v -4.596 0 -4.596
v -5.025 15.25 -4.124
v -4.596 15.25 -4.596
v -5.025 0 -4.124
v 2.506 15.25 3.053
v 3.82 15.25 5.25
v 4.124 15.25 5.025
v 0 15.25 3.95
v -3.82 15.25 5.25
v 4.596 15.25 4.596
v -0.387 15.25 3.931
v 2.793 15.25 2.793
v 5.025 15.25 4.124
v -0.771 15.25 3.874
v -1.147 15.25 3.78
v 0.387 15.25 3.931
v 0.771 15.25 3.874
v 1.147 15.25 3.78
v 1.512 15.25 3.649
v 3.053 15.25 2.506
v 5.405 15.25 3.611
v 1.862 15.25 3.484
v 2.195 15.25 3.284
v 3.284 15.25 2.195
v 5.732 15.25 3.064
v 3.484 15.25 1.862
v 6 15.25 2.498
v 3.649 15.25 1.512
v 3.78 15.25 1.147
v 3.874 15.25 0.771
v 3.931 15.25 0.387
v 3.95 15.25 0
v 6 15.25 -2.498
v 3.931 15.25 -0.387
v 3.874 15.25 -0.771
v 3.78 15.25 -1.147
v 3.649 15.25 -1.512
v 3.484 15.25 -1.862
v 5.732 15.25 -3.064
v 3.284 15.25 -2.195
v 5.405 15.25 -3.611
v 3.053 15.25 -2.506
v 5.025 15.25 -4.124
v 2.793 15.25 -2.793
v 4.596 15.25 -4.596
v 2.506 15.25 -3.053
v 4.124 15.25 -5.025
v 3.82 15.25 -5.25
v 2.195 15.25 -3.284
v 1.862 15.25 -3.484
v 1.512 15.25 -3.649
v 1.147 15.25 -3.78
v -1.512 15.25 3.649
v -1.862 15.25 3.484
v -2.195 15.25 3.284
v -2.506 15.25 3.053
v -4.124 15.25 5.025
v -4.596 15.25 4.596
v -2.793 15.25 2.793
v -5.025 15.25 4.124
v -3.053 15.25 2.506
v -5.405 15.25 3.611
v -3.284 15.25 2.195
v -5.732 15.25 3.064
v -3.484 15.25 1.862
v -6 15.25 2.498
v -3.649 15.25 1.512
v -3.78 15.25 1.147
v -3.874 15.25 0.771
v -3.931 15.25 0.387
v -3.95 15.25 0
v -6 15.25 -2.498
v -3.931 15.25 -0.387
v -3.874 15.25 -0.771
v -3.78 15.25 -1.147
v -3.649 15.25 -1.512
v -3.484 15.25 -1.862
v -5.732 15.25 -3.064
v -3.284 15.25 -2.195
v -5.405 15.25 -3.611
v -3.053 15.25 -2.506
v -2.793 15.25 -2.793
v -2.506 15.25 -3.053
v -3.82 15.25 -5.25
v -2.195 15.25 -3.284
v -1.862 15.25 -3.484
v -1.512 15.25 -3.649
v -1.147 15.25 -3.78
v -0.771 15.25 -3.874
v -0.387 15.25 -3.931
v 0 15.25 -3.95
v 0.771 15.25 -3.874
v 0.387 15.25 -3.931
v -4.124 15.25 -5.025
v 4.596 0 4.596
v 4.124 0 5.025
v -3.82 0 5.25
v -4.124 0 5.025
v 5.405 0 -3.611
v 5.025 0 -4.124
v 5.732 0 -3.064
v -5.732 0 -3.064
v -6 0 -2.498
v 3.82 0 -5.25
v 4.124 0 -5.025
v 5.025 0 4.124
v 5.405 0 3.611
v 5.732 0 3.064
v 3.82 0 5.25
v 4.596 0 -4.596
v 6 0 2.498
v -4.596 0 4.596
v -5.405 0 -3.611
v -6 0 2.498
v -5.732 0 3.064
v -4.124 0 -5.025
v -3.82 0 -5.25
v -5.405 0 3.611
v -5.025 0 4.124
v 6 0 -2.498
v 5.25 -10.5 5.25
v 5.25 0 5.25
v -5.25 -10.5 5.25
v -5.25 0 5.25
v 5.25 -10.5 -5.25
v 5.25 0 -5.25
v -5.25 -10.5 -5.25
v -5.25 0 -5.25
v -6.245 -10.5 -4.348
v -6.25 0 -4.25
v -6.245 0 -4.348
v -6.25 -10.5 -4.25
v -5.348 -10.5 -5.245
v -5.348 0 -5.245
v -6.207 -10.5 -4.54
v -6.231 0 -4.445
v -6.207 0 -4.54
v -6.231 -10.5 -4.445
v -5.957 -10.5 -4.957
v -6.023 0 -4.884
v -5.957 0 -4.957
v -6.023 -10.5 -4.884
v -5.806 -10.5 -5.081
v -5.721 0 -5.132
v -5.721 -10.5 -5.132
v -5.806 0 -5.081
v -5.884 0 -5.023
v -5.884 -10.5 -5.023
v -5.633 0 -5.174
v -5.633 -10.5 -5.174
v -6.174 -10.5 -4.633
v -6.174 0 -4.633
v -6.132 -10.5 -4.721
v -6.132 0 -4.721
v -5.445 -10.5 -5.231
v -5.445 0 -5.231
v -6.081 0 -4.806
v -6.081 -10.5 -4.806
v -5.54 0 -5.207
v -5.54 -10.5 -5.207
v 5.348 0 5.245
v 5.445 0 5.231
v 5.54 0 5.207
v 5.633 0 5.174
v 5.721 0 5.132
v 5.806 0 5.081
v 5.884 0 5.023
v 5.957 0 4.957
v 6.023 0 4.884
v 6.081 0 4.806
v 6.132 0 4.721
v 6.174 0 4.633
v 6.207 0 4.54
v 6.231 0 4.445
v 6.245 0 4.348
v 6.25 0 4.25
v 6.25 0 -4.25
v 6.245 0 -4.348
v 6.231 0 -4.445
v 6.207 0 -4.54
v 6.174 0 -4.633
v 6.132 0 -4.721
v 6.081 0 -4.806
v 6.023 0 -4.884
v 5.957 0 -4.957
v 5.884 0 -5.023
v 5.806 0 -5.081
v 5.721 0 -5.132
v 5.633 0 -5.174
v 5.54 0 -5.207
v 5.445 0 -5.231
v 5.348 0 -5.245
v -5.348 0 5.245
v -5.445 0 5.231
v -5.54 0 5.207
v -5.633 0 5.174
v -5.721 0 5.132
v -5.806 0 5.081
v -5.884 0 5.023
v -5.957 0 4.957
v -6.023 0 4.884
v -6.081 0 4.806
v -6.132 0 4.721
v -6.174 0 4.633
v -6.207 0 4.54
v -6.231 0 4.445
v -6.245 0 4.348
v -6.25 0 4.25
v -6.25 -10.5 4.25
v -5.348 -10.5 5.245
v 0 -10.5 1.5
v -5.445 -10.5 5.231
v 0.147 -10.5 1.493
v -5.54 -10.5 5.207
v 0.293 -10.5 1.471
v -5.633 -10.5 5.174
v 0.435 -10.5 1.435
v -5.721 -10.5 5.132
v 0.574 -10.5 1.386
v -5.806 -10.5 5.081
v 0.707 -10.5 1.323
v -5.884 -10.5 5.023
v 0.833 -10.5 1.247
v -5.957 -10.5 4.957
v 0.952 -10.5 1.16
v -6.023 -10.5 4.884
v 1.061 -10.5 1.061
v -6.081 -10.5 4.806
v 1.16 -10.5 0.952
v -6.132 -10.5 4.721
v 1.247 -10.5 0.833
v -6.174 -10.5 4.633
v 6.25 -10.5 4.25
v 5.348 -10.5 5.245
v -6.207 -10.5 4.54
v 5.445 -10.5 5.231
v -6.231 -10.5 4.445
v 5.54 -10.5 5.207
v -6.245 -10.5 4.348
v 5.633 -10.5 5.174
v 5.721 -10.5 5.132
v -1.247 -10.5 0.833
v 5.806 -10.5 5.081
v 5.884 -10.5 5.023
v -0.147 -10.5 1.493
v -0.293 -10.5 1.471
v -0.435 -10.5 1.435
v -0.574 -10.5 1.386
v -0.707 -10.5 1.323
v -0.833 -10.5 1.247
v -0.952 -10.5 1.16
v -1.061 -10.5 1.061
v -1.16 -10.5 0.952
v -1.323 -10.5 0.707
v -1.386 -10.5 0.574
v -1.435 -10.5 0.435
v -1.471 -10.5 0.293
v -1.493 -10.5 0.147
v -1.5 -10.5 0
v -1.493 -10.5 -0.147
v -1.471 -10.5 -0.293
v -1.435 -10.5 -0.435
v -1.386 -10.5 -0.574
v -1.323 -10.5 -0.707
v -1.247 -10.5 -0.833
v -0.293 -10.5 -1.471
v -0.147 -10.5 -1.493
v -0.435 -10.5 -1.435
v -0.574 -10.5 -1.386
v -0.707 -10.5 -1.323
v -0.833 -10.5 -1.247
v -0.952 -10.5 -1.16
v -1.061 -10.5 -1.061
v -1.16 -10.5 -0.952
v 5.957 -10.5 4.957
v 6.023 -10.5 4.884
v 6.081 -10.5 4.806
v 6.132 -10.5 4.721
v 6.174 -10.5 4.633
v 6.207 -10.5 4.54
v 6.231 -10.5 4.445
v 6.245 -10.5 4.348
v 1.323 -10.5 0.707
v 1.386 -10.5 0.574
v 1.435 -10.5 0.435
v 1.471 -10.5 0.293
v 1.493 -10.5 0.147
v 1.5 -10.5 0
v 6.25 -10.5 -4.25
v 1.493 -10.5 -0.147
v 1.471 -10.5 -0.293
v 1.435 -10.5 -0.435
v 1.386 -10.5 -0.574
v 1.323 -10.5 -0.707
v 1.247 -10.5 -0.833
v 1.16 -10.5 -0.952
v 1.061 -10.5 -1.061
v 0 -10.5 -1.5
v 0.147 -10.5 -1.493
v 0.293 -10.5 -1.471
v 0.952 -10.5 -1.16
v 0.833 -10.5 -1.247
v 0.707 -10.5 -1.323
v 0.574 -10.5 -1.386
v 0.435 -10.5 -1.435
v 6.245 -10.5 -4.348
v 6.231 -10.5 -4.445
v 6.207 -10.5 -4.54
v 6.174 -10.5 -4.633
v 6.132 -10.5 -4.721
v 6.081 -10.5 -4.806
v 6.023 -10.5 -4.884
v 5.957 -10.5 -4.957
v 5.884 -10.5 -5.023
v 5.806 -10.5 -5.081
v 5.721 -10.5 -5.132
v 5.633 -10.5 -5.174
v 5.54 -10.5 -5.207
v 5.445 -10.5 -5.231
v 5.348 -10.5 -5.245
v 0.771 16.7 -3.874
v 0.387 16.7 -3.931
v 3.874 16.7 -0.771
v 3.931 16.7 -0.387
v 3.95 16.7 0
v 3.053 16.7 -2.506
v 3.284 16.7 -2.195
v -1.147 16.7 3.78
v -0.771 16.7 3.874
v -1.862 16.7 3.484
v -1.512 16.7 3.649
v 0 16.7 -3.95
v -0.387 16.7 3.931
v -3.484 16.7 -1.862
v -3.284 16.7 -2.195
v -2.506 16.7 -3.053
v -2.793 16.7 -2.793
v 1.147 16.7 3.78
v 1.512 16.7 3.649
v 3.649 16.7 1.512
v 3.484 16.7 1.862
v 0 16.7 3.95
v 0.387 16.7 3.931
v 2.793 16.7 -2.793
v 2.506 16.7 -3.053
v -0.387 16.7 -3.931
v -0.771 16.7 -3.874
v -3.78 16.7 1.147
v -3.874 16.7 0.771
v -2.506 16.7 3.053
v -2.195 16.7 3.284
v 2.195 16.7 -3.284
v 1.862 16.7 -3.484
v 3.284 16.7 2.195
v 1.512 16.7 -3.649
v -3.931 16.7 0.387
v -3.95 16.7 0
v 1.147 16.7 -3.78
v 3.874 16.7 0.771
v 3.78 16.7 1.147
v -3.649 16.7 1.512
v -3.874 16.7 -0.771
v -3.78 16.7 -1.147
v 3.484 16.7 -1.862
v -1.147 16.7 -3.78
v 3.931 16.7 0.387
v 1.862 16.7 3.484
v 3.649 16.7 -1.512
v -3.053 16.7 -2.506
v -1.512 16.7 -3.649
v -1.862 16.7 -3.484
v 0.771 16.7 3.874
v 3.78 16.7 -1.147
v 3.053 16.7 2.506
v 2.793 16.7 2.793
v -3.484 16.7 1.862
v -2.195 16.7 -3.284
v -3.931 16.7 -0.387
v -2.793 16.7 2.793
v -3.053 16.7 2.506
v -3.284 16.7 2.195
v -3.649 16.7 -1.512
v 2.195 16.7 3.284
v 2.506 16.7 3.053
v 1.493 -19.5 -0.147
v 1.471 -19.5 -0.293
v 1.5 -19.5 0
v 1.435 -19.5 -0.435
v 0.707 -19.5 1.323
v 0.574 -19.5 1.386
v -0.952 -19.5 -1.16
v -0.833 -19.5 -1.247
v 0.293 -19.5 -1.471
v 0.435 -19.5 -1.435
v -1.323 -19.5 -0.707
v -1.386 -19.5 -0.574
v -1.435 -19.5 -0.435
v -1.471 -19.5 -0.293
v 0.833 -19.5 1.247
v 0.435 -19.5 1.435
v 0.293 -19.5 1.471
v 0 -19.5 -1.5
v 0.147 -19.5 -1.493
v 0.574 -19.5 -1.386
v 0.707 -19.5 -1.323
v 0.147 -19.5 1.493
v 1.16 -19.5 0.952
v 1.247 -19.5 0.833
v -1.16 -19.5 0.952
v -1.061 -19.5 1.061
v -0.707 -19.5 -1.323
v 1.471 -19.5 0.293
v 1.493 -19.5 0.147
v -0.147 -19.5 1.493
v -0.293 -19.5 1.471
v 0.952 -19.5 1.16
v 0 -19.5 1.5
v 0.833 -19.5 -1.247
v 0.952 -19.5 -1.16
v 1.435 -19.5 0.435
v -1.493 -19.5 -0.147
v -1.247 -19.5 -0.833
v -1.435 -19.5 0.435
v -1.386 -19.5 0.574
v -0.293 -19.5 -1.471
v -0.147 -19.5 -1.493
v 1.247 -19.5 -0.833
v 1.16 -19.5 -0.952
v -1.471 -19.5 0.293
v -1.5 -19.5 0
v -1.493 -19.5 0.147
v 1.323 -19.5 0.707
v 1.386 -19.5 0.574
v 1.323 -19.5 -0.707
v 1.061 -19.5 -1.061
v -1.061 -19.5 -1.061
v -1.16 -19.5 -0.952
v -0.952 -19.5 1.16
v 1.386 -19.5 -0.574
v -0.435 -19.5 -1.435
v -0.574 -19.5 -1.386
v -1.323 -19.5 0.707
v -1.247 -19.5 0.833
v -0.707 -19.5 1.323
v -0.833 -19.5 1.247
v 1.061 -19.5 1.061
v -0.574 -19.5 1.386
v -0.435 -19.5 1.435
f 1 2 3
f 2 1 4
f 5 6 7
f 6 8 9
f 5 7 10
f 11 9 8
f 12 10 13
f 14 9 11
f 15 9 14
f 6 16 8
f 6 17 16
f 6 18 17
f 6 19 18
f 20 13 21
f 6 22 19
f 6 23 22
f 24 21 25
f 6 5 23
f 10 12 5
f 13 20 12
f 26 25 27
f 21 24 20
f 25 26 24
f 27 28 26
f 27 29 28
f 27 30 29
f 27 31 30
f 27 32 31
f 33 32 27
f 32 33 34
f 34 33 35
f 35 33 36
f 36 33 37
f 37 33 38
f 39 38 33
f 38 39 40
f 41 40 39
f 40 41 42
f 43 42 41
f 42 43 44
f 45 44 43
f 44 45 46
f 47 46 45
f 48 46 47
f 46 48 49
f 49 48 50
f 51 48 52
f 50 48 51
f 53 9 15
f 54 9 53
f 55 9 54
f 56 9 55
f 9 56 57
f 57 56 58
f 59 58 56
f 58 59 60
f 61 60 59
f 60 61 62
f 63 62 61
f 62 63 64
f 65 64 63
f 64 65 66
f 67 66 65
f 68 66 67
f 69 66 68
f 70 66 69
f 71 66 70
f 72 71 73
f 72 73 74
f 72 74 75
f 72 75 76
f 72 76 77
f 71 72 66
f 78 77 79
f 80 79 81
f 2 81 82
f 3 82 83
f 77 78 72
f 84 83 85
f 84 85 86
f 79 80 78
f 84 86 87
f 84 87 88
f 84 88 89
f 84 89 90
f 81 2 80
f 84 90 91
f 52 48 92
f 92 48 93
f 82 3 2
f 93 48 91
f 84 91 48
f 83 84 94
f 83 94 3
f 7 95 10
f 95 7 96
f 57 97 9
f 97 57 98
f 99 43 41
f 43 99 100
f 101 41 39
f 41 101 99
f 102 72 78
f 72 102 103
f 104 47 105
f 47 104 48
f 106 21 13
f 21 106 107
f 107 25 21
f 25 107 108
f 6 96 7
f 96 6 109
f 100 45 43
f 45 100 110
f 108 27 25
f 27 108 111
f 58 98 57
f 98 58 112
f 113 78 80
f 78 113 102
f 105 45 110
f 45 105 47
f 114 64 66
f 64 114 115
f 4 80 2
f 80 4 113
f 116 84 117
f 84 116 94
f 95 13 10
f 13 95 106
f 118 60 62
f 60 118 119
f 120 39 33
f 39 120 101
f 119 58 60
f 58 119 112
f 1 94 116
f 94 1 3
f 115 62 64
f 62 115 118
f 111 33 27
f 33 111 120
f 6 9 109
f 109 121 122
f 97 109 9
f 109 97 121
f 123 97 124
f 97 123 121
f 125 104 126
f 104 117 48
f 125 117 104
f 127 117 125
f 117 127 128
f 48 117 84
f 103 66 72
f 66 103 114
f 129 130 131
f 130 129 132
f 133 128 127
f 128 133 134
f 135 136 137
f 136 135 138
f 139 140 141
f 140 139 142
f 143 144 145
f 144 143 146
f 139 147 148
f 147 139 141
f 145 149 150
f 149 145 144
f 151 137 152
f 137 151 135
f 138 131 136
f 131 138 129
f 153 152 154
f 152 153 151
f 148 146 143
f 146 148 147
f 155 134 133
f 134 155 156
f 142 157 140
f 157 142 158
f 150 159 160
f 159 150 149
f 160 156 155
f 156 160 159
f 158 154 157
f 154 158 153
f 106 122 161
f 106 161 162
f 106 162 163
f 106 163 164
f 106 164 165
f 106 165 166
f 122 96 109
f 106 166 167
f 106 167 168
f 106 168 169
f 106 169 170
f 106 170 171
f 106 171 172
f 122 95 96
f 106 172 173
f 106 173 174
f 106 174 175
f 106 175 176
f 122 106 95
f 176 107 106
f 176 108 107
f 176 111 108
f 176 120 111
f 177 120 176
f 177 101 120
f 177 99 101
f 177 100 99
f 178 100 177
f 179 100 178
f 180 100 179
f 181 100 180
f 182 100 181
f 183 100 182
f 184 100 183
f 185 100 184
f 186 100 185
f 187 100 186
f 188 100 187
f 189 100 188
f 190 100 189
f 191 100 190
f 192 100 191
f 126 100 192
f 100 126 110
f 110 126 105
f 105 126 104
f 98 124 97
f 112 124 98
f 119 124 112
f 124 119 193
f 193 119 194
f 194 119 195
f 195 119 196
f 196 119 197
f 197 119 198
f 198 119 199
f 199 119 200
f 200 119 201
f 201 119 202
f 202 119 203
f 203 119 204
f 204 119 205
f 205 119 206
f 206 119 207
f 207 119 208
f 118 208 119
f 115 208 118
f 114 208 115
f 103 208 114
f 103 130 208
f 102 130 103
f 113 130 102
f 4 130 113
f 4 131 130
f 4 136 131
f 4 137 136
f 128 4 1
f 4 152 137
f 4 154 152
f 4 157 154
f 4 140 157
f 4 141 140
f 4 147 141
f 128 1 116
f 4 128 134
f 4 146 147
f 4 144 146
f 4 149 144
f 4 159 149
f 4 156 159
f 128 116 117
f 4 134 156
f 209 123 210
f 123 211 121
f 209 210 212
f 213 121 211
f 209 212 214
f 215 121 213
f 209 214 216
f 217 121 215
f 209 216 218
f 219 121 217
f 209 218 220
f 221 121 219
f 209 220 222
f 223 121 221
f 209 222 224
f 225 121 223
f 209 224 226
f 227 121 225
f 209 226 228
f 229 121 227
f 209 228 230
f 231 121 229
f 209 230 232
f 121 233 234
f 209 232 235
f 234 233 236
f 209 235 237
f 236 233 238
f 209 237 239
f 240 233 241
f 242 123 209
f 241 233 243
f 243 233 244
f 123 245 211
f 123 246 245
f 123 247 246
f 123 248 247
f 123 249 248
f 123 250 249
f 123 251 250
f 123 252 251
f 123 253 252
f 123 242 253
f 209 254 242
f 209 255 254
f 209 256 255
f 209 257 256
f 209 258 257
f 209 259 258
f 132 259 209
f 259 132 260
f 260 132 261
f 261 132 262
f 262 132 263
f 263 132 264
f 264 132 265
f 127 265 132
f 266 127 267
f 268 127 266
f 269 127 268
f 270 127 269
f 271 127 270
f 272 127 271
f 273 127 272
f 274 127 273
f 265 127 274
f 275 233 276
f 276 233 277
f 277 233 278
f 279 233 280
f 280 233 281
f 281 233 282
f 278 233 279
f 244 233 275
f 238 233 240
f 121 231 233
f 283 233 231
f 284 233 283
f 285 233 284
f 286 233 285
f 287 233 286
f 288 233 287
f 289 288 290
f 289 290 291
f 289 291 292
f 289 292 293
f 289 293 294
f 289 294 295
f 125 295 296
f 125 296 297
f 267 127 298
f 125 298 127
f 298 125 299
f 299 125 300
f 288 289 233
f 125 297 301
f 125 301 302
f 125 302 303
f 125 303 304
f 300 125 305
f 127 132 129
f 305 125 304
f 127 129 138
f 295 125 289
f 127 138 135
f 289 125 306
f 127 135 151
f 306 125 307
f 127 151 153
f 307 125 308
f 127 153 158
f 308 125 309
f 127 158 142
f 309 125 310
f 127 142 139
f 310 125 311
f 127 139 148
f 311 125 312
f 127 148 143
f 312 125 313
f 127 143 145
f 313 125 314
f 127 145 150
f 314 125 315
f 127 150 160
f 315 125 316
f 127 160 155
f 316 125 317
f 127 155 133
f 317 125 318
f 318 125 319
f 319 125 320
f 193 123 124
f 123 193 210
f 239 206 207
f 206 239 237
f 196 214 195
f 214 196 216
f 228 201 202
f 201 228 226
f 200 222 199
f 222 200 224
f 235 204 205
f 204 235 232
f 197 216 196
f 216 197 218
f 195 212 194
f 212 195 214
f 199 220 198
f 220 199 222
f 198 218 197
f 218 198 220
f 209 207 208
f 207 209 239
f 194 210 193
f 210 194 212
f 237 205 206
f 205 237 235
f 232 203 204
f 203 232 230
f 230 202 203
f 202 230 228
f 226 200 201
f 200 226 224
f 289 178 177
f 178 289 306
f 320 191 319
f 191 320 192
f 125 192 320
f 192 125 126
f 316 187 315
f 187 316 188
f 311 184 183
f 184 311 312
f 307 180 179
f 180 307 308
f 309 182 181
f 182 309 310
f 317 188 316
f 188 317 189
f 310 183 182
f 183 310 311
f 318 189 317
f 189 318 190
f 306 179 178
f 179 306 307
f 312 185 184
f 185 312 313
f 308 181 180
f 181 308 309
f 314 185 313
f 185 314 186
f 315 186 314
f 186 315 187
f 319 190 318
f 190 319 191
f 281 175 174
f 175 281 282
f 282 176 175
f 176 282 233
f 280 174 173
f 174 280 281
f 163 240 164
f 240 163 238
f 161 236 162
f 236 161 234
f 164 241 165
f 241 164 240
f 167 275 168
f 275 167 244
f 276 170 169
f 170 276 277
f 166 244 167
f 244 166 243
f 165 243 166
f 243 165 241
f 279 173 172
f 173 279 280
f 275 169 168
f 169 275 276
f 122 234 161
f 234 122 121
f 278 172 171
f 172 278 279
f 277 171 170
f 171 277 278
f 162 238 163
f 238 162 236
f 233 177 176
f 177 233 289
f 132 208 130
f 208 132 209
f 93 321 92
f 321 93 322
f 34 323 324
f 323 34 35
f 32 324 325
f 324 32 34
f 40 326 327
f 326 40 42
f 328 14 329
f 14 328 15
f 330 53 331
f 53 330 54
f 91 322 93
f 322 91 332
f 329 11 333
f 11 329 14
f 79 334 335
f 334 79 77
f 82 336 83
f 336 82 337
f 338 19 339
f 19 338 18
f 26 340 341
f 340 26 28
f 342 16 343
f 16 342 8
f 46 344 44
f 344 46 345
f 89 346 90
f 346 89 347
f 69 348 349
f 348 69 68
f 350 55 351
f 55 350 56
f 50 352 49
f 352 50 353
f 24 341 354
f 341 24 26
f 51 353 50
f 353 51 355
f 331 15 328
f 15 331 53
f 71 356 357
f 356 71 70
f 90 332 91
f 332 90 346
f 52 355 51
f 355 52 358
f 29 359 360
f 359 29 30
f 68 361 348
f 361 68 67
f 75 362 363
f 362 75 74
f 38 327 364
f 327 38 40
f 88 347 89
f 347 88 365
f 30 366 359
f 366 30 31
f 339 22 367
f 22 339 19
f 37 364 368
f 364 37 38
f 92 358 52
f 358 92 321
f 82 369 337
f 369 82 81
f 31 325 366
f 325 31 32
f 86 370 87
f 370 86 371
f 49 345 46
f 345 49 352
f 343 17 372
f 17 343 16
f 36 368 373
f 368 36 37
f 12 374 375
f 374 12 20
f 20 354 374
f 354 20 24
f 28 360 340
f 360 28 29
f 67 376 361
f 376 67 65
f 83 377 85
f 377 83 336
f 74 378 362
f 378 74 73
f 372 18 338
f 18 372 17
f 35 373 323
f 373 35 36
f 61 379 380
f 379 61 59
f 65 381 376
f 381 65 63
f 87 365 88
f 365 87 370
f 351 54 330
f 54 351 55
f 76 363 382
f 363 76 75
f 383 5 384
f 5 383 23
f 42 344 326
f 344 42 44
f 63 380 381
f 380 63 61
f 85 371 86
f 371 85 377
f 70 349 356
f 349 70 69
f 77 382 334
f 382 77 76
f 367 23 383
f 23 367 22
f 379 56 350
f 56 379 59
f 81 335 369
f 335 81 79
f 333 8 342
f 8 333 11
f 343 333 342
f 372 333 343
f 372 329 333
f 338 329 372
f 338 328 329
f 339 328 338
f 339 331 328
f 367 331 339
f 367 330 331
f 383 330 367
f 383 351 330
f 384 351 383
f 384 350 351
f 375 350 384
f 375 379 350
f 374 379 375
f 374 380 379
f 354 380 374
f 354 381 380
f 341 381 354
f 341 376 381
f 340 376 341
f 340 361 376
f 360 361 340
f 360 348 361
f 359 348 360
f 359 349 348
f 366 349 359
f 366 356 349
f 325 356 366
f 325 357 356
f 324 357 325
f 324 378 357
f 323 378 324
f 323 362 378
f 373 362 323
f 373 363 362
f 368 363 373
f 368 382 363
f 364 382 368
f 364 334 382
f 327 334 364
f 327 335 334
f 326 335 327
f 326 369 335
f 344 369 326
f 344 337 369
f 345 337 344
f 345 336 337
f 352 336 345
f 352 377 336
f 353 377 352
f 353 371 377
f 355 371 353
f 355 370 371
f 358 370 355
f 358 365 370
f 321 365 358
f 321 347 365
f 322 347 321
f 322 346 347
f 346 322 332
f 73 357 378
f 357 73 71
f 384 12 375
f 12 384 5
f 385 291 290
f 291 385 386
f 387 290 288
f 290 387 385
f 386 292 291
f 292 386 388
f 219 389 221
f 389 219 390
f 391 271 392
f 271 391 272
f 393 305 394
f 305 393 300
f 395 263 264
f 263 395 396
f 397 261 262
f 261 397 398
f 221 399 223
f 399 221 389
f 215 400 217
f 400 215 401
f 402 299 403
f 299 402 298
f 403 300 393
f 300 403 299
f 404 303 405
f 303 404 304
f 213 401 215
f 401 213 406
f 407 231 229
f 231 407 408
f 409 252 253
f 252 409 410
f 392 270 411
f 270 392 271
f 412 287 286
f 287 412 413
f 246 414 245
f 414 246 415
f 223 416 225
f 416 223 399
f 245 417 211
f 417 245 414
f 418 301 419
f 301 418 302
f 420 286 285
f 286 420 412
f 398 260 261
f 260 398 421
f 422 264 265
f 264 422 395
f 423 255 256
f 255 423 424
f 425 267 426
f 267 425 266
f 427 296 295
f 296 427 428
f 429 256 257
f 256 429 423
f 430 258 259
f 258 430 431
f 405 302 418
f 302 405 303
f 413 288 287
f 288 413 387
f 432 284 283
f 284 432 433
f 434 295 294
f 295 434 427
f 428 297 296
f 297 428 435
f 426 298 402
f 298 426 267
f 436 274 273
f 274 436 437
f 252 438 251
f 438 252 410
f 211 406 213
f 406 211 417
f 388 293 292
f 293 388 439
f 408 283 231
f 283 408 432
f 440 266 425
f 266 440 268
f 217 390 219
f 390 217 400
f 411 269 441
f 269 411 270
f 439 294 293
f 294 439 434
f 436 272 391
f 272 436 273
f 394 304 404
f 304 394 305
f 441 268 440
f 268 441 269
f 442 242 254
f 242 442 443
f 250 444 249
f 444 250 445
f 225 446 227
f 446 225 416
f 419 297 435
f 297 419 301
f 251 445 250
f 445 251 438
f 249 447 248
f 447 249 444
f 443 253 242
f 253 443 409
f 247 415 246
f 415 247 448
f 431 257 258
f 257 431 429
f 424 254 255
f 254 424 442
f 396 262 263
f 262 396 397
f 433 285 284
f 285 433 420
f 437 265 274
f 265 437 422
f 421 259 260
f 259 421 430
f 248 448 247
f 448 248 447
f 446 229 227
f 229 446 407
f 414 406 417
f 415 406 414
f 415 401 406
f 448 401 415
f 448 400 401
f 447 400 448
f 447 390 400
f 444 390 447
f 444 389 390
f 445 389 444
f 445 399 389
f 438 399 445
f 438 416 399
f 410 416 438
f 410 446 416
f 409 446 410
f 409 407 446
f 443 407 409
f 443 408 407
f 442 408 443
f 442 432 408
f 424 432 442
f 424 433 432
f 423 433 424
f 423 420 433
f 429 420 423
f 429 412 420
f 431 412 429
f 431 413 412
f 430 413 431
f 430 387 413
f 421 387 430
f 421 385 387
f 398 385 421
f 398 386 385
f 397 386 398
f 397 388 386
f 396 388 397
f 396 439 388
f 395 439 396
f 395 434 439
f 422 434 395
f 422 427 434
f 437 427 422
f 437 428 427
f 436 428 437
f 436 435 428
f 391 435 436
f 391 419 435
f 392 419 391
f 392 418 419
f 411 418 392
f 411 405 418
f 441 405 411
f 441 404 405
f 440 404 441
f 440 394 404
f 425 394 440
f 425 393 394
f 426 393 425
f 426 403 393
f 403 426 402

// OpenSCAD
// file: common.scad
module sqrt_position(dim) {
    for(x = [-dim[0], dim[0]])
        for(y = [-dim[1], dim[1]])
            translate([x, y, 0]) for(i=[0:$children-1]) children(i);
}

module line(num, x_step, y_step) {
    for(n = [0:num-1]) translate([n*x_step, n*y_step, 0])
        for(i=[0:$children-1]) children(i);
}

module rcube(dim, r) {
    for(x = [-dim[0]/2+r, dim[0]/2-r])
        for(y = [-dim[1]/2+r, dim[1]/2-r])
            translate([x, y, 0]) cylinder(r = r, h = dim[2], center = true);
    cube([dim[0]-2*r, dim[1],     dim[2]], center = true);
    cube([dim[0],     dim[1]-2*r, dim[2]], center = true);
}

module rsquare(dim, r) {
    for(x = [-dim[0]/2+r, dim[0]/2-r])
        for(y = [-dim[1]/2+r, dim[1]/2-r])
            translate([x, y]) circle(r = r);
    square([dim[0]-2*r, dim[1]], center = true);
    square([dim[0], dim[1]-2*r], center = true);
}

module rect(dim) {
    for(x = [-dim[0]/2, dim[0]/2])
        for(y = [-dim[1]/2, dim[1]/2])        
            translate([x, y, 0]) for(i=[0:$children-1]) children(i);
}

module points(pts) {
    num = len(pts);
    for(n = [0:num-1]) translate(pts[i]) 
        for(i=[0:$children-1]) children(i);
}

module arc(r1, r2, angle_begin, angle_end) {
    r0 = (r1 - r2)/2+r2;
    polygon(points = a_arc(r1 = r1, r2 = r2, angle_begin = angle_begin, angle_end = angle_end));
    for(a = [angle_begin, angle_end])
        rotate([0, 0, a]) translate([r0, 0]) circle(r = (r1 - r2)/2);
}

module pie(r1, r2, d, angle_begin, angle_end) {
    r0 = (r1 - r2)/2+r2;
    polygon(points = a_arc(r1 = r1, r2 = r2, angle_begin = angle_begin, angle_end = angle_end));
    hull() {
        for(a = [angle_begin, angle_end])
            rotate([0, 0, a]) translate([r0, 0]) circle(r = (r1 - r2)/2);
        translate([r0-d+(r1 - r2), 0]) circle(r = (r1 - r2)/2);
    }
}

function a_arc(r1, r2, angle_begin, angle_end) = 
    concat(a_pie(r = r1, angle_begin = angle_begin, angle_end = angle_end), 
           a_pie(r = r2, angle_begin = angle_end, angle_end = angle_begin));

function a_pie(r, angle_begin, angle_end, step = 0.1) = [
    for(angle = [angle_begin : (angle_begin < angle_end)?(step):(-step) : angle_end]) 
        a_point(r, angle)
];

function a_point(r, angle) = 
[
	r * cos(angle), 
	r * sin(angle)
];
// main file
$fn = 64;
use <common.scad>

micro_motor_outline();
//micro_motor();

module micro_motor_outline(extra = 0.5) {
    translate([0, (15+extra)/2-extra, 0])
    intersection() {
        rotate([90, 0, 0]) cylinder(r = 6+extra, h = 15+2*extra, center = true);
        cube([12, 15+2*extra, 10+extra], center = true);
    }
    rotate([-90, 0, 0]) 
        cylinder(r = 6.9/2+extra, h = 16.2+extra);

    translate([0, -(10+extra)/2, 0])
        rotate([90, 0, 0]) rcube([12.5, 10+extra, 10+extra], r = 1);
    
   translate([0, -19-extra, 0])
        rotate([-90, 0, 0]) cylinder(r = 1.5, h = 20+extra);
}

module micro_motor() {
    translate([0, 7.5, 0])
    color("grey") intersection() {
        rotate([90, 0, 0]) cylinder(r = 6, h = 20, center = true);
        cube([12, 15, 10], center = true);
    }
    color("red") rotate([-90, 0, 0]) cylinder(r = 6.9/2, h = 16.2);

    difference() {
        union() {
            translate([0, -0.7/2, 0])
                color("red") rotate([90, 0, 0]) rcube([12.5, 10, 0.7], r = 1);//cube([12, 0.7, 10], center = true);
            translate([0, -3.6, 0])
                color("red") rotate([90, 0, 0]) rcube([12.5, 10, 0.7], r = 1);//cube([12, 0.7, 10], center = true);
            translate([0, -8.6, 0])
                color("red") rotate([90, 0, 0]) rcube([12.5, 10, 0.7], r = 1);//cube([12, 0.7, 10], center = true);
            translate([-4, -9, -3])
                color("grey") rotate([-90, 0, 0]) cylinder(r = 1.5, h = 9);
            translate([ 4, -9,  3])
                color("grey") rotate([-90, 0, 0]) cylinder(r = 1.5, h = 9);
        }
        translate([-4.5, -10, 0])
            rotate([-90, 0, 0]) cylinder(r = 1.6/2, h = 16.2);
        translate([ 4.5, -10, 0])
            rotate([-90, 0, 0]) cylinder(r = 1.6/2, h = 16.2);
    }
   color("grey") translate([0, -19, 0])
        rotate([-90, 0, 0]) cylinder(r = 1.5, h = 20);
}
